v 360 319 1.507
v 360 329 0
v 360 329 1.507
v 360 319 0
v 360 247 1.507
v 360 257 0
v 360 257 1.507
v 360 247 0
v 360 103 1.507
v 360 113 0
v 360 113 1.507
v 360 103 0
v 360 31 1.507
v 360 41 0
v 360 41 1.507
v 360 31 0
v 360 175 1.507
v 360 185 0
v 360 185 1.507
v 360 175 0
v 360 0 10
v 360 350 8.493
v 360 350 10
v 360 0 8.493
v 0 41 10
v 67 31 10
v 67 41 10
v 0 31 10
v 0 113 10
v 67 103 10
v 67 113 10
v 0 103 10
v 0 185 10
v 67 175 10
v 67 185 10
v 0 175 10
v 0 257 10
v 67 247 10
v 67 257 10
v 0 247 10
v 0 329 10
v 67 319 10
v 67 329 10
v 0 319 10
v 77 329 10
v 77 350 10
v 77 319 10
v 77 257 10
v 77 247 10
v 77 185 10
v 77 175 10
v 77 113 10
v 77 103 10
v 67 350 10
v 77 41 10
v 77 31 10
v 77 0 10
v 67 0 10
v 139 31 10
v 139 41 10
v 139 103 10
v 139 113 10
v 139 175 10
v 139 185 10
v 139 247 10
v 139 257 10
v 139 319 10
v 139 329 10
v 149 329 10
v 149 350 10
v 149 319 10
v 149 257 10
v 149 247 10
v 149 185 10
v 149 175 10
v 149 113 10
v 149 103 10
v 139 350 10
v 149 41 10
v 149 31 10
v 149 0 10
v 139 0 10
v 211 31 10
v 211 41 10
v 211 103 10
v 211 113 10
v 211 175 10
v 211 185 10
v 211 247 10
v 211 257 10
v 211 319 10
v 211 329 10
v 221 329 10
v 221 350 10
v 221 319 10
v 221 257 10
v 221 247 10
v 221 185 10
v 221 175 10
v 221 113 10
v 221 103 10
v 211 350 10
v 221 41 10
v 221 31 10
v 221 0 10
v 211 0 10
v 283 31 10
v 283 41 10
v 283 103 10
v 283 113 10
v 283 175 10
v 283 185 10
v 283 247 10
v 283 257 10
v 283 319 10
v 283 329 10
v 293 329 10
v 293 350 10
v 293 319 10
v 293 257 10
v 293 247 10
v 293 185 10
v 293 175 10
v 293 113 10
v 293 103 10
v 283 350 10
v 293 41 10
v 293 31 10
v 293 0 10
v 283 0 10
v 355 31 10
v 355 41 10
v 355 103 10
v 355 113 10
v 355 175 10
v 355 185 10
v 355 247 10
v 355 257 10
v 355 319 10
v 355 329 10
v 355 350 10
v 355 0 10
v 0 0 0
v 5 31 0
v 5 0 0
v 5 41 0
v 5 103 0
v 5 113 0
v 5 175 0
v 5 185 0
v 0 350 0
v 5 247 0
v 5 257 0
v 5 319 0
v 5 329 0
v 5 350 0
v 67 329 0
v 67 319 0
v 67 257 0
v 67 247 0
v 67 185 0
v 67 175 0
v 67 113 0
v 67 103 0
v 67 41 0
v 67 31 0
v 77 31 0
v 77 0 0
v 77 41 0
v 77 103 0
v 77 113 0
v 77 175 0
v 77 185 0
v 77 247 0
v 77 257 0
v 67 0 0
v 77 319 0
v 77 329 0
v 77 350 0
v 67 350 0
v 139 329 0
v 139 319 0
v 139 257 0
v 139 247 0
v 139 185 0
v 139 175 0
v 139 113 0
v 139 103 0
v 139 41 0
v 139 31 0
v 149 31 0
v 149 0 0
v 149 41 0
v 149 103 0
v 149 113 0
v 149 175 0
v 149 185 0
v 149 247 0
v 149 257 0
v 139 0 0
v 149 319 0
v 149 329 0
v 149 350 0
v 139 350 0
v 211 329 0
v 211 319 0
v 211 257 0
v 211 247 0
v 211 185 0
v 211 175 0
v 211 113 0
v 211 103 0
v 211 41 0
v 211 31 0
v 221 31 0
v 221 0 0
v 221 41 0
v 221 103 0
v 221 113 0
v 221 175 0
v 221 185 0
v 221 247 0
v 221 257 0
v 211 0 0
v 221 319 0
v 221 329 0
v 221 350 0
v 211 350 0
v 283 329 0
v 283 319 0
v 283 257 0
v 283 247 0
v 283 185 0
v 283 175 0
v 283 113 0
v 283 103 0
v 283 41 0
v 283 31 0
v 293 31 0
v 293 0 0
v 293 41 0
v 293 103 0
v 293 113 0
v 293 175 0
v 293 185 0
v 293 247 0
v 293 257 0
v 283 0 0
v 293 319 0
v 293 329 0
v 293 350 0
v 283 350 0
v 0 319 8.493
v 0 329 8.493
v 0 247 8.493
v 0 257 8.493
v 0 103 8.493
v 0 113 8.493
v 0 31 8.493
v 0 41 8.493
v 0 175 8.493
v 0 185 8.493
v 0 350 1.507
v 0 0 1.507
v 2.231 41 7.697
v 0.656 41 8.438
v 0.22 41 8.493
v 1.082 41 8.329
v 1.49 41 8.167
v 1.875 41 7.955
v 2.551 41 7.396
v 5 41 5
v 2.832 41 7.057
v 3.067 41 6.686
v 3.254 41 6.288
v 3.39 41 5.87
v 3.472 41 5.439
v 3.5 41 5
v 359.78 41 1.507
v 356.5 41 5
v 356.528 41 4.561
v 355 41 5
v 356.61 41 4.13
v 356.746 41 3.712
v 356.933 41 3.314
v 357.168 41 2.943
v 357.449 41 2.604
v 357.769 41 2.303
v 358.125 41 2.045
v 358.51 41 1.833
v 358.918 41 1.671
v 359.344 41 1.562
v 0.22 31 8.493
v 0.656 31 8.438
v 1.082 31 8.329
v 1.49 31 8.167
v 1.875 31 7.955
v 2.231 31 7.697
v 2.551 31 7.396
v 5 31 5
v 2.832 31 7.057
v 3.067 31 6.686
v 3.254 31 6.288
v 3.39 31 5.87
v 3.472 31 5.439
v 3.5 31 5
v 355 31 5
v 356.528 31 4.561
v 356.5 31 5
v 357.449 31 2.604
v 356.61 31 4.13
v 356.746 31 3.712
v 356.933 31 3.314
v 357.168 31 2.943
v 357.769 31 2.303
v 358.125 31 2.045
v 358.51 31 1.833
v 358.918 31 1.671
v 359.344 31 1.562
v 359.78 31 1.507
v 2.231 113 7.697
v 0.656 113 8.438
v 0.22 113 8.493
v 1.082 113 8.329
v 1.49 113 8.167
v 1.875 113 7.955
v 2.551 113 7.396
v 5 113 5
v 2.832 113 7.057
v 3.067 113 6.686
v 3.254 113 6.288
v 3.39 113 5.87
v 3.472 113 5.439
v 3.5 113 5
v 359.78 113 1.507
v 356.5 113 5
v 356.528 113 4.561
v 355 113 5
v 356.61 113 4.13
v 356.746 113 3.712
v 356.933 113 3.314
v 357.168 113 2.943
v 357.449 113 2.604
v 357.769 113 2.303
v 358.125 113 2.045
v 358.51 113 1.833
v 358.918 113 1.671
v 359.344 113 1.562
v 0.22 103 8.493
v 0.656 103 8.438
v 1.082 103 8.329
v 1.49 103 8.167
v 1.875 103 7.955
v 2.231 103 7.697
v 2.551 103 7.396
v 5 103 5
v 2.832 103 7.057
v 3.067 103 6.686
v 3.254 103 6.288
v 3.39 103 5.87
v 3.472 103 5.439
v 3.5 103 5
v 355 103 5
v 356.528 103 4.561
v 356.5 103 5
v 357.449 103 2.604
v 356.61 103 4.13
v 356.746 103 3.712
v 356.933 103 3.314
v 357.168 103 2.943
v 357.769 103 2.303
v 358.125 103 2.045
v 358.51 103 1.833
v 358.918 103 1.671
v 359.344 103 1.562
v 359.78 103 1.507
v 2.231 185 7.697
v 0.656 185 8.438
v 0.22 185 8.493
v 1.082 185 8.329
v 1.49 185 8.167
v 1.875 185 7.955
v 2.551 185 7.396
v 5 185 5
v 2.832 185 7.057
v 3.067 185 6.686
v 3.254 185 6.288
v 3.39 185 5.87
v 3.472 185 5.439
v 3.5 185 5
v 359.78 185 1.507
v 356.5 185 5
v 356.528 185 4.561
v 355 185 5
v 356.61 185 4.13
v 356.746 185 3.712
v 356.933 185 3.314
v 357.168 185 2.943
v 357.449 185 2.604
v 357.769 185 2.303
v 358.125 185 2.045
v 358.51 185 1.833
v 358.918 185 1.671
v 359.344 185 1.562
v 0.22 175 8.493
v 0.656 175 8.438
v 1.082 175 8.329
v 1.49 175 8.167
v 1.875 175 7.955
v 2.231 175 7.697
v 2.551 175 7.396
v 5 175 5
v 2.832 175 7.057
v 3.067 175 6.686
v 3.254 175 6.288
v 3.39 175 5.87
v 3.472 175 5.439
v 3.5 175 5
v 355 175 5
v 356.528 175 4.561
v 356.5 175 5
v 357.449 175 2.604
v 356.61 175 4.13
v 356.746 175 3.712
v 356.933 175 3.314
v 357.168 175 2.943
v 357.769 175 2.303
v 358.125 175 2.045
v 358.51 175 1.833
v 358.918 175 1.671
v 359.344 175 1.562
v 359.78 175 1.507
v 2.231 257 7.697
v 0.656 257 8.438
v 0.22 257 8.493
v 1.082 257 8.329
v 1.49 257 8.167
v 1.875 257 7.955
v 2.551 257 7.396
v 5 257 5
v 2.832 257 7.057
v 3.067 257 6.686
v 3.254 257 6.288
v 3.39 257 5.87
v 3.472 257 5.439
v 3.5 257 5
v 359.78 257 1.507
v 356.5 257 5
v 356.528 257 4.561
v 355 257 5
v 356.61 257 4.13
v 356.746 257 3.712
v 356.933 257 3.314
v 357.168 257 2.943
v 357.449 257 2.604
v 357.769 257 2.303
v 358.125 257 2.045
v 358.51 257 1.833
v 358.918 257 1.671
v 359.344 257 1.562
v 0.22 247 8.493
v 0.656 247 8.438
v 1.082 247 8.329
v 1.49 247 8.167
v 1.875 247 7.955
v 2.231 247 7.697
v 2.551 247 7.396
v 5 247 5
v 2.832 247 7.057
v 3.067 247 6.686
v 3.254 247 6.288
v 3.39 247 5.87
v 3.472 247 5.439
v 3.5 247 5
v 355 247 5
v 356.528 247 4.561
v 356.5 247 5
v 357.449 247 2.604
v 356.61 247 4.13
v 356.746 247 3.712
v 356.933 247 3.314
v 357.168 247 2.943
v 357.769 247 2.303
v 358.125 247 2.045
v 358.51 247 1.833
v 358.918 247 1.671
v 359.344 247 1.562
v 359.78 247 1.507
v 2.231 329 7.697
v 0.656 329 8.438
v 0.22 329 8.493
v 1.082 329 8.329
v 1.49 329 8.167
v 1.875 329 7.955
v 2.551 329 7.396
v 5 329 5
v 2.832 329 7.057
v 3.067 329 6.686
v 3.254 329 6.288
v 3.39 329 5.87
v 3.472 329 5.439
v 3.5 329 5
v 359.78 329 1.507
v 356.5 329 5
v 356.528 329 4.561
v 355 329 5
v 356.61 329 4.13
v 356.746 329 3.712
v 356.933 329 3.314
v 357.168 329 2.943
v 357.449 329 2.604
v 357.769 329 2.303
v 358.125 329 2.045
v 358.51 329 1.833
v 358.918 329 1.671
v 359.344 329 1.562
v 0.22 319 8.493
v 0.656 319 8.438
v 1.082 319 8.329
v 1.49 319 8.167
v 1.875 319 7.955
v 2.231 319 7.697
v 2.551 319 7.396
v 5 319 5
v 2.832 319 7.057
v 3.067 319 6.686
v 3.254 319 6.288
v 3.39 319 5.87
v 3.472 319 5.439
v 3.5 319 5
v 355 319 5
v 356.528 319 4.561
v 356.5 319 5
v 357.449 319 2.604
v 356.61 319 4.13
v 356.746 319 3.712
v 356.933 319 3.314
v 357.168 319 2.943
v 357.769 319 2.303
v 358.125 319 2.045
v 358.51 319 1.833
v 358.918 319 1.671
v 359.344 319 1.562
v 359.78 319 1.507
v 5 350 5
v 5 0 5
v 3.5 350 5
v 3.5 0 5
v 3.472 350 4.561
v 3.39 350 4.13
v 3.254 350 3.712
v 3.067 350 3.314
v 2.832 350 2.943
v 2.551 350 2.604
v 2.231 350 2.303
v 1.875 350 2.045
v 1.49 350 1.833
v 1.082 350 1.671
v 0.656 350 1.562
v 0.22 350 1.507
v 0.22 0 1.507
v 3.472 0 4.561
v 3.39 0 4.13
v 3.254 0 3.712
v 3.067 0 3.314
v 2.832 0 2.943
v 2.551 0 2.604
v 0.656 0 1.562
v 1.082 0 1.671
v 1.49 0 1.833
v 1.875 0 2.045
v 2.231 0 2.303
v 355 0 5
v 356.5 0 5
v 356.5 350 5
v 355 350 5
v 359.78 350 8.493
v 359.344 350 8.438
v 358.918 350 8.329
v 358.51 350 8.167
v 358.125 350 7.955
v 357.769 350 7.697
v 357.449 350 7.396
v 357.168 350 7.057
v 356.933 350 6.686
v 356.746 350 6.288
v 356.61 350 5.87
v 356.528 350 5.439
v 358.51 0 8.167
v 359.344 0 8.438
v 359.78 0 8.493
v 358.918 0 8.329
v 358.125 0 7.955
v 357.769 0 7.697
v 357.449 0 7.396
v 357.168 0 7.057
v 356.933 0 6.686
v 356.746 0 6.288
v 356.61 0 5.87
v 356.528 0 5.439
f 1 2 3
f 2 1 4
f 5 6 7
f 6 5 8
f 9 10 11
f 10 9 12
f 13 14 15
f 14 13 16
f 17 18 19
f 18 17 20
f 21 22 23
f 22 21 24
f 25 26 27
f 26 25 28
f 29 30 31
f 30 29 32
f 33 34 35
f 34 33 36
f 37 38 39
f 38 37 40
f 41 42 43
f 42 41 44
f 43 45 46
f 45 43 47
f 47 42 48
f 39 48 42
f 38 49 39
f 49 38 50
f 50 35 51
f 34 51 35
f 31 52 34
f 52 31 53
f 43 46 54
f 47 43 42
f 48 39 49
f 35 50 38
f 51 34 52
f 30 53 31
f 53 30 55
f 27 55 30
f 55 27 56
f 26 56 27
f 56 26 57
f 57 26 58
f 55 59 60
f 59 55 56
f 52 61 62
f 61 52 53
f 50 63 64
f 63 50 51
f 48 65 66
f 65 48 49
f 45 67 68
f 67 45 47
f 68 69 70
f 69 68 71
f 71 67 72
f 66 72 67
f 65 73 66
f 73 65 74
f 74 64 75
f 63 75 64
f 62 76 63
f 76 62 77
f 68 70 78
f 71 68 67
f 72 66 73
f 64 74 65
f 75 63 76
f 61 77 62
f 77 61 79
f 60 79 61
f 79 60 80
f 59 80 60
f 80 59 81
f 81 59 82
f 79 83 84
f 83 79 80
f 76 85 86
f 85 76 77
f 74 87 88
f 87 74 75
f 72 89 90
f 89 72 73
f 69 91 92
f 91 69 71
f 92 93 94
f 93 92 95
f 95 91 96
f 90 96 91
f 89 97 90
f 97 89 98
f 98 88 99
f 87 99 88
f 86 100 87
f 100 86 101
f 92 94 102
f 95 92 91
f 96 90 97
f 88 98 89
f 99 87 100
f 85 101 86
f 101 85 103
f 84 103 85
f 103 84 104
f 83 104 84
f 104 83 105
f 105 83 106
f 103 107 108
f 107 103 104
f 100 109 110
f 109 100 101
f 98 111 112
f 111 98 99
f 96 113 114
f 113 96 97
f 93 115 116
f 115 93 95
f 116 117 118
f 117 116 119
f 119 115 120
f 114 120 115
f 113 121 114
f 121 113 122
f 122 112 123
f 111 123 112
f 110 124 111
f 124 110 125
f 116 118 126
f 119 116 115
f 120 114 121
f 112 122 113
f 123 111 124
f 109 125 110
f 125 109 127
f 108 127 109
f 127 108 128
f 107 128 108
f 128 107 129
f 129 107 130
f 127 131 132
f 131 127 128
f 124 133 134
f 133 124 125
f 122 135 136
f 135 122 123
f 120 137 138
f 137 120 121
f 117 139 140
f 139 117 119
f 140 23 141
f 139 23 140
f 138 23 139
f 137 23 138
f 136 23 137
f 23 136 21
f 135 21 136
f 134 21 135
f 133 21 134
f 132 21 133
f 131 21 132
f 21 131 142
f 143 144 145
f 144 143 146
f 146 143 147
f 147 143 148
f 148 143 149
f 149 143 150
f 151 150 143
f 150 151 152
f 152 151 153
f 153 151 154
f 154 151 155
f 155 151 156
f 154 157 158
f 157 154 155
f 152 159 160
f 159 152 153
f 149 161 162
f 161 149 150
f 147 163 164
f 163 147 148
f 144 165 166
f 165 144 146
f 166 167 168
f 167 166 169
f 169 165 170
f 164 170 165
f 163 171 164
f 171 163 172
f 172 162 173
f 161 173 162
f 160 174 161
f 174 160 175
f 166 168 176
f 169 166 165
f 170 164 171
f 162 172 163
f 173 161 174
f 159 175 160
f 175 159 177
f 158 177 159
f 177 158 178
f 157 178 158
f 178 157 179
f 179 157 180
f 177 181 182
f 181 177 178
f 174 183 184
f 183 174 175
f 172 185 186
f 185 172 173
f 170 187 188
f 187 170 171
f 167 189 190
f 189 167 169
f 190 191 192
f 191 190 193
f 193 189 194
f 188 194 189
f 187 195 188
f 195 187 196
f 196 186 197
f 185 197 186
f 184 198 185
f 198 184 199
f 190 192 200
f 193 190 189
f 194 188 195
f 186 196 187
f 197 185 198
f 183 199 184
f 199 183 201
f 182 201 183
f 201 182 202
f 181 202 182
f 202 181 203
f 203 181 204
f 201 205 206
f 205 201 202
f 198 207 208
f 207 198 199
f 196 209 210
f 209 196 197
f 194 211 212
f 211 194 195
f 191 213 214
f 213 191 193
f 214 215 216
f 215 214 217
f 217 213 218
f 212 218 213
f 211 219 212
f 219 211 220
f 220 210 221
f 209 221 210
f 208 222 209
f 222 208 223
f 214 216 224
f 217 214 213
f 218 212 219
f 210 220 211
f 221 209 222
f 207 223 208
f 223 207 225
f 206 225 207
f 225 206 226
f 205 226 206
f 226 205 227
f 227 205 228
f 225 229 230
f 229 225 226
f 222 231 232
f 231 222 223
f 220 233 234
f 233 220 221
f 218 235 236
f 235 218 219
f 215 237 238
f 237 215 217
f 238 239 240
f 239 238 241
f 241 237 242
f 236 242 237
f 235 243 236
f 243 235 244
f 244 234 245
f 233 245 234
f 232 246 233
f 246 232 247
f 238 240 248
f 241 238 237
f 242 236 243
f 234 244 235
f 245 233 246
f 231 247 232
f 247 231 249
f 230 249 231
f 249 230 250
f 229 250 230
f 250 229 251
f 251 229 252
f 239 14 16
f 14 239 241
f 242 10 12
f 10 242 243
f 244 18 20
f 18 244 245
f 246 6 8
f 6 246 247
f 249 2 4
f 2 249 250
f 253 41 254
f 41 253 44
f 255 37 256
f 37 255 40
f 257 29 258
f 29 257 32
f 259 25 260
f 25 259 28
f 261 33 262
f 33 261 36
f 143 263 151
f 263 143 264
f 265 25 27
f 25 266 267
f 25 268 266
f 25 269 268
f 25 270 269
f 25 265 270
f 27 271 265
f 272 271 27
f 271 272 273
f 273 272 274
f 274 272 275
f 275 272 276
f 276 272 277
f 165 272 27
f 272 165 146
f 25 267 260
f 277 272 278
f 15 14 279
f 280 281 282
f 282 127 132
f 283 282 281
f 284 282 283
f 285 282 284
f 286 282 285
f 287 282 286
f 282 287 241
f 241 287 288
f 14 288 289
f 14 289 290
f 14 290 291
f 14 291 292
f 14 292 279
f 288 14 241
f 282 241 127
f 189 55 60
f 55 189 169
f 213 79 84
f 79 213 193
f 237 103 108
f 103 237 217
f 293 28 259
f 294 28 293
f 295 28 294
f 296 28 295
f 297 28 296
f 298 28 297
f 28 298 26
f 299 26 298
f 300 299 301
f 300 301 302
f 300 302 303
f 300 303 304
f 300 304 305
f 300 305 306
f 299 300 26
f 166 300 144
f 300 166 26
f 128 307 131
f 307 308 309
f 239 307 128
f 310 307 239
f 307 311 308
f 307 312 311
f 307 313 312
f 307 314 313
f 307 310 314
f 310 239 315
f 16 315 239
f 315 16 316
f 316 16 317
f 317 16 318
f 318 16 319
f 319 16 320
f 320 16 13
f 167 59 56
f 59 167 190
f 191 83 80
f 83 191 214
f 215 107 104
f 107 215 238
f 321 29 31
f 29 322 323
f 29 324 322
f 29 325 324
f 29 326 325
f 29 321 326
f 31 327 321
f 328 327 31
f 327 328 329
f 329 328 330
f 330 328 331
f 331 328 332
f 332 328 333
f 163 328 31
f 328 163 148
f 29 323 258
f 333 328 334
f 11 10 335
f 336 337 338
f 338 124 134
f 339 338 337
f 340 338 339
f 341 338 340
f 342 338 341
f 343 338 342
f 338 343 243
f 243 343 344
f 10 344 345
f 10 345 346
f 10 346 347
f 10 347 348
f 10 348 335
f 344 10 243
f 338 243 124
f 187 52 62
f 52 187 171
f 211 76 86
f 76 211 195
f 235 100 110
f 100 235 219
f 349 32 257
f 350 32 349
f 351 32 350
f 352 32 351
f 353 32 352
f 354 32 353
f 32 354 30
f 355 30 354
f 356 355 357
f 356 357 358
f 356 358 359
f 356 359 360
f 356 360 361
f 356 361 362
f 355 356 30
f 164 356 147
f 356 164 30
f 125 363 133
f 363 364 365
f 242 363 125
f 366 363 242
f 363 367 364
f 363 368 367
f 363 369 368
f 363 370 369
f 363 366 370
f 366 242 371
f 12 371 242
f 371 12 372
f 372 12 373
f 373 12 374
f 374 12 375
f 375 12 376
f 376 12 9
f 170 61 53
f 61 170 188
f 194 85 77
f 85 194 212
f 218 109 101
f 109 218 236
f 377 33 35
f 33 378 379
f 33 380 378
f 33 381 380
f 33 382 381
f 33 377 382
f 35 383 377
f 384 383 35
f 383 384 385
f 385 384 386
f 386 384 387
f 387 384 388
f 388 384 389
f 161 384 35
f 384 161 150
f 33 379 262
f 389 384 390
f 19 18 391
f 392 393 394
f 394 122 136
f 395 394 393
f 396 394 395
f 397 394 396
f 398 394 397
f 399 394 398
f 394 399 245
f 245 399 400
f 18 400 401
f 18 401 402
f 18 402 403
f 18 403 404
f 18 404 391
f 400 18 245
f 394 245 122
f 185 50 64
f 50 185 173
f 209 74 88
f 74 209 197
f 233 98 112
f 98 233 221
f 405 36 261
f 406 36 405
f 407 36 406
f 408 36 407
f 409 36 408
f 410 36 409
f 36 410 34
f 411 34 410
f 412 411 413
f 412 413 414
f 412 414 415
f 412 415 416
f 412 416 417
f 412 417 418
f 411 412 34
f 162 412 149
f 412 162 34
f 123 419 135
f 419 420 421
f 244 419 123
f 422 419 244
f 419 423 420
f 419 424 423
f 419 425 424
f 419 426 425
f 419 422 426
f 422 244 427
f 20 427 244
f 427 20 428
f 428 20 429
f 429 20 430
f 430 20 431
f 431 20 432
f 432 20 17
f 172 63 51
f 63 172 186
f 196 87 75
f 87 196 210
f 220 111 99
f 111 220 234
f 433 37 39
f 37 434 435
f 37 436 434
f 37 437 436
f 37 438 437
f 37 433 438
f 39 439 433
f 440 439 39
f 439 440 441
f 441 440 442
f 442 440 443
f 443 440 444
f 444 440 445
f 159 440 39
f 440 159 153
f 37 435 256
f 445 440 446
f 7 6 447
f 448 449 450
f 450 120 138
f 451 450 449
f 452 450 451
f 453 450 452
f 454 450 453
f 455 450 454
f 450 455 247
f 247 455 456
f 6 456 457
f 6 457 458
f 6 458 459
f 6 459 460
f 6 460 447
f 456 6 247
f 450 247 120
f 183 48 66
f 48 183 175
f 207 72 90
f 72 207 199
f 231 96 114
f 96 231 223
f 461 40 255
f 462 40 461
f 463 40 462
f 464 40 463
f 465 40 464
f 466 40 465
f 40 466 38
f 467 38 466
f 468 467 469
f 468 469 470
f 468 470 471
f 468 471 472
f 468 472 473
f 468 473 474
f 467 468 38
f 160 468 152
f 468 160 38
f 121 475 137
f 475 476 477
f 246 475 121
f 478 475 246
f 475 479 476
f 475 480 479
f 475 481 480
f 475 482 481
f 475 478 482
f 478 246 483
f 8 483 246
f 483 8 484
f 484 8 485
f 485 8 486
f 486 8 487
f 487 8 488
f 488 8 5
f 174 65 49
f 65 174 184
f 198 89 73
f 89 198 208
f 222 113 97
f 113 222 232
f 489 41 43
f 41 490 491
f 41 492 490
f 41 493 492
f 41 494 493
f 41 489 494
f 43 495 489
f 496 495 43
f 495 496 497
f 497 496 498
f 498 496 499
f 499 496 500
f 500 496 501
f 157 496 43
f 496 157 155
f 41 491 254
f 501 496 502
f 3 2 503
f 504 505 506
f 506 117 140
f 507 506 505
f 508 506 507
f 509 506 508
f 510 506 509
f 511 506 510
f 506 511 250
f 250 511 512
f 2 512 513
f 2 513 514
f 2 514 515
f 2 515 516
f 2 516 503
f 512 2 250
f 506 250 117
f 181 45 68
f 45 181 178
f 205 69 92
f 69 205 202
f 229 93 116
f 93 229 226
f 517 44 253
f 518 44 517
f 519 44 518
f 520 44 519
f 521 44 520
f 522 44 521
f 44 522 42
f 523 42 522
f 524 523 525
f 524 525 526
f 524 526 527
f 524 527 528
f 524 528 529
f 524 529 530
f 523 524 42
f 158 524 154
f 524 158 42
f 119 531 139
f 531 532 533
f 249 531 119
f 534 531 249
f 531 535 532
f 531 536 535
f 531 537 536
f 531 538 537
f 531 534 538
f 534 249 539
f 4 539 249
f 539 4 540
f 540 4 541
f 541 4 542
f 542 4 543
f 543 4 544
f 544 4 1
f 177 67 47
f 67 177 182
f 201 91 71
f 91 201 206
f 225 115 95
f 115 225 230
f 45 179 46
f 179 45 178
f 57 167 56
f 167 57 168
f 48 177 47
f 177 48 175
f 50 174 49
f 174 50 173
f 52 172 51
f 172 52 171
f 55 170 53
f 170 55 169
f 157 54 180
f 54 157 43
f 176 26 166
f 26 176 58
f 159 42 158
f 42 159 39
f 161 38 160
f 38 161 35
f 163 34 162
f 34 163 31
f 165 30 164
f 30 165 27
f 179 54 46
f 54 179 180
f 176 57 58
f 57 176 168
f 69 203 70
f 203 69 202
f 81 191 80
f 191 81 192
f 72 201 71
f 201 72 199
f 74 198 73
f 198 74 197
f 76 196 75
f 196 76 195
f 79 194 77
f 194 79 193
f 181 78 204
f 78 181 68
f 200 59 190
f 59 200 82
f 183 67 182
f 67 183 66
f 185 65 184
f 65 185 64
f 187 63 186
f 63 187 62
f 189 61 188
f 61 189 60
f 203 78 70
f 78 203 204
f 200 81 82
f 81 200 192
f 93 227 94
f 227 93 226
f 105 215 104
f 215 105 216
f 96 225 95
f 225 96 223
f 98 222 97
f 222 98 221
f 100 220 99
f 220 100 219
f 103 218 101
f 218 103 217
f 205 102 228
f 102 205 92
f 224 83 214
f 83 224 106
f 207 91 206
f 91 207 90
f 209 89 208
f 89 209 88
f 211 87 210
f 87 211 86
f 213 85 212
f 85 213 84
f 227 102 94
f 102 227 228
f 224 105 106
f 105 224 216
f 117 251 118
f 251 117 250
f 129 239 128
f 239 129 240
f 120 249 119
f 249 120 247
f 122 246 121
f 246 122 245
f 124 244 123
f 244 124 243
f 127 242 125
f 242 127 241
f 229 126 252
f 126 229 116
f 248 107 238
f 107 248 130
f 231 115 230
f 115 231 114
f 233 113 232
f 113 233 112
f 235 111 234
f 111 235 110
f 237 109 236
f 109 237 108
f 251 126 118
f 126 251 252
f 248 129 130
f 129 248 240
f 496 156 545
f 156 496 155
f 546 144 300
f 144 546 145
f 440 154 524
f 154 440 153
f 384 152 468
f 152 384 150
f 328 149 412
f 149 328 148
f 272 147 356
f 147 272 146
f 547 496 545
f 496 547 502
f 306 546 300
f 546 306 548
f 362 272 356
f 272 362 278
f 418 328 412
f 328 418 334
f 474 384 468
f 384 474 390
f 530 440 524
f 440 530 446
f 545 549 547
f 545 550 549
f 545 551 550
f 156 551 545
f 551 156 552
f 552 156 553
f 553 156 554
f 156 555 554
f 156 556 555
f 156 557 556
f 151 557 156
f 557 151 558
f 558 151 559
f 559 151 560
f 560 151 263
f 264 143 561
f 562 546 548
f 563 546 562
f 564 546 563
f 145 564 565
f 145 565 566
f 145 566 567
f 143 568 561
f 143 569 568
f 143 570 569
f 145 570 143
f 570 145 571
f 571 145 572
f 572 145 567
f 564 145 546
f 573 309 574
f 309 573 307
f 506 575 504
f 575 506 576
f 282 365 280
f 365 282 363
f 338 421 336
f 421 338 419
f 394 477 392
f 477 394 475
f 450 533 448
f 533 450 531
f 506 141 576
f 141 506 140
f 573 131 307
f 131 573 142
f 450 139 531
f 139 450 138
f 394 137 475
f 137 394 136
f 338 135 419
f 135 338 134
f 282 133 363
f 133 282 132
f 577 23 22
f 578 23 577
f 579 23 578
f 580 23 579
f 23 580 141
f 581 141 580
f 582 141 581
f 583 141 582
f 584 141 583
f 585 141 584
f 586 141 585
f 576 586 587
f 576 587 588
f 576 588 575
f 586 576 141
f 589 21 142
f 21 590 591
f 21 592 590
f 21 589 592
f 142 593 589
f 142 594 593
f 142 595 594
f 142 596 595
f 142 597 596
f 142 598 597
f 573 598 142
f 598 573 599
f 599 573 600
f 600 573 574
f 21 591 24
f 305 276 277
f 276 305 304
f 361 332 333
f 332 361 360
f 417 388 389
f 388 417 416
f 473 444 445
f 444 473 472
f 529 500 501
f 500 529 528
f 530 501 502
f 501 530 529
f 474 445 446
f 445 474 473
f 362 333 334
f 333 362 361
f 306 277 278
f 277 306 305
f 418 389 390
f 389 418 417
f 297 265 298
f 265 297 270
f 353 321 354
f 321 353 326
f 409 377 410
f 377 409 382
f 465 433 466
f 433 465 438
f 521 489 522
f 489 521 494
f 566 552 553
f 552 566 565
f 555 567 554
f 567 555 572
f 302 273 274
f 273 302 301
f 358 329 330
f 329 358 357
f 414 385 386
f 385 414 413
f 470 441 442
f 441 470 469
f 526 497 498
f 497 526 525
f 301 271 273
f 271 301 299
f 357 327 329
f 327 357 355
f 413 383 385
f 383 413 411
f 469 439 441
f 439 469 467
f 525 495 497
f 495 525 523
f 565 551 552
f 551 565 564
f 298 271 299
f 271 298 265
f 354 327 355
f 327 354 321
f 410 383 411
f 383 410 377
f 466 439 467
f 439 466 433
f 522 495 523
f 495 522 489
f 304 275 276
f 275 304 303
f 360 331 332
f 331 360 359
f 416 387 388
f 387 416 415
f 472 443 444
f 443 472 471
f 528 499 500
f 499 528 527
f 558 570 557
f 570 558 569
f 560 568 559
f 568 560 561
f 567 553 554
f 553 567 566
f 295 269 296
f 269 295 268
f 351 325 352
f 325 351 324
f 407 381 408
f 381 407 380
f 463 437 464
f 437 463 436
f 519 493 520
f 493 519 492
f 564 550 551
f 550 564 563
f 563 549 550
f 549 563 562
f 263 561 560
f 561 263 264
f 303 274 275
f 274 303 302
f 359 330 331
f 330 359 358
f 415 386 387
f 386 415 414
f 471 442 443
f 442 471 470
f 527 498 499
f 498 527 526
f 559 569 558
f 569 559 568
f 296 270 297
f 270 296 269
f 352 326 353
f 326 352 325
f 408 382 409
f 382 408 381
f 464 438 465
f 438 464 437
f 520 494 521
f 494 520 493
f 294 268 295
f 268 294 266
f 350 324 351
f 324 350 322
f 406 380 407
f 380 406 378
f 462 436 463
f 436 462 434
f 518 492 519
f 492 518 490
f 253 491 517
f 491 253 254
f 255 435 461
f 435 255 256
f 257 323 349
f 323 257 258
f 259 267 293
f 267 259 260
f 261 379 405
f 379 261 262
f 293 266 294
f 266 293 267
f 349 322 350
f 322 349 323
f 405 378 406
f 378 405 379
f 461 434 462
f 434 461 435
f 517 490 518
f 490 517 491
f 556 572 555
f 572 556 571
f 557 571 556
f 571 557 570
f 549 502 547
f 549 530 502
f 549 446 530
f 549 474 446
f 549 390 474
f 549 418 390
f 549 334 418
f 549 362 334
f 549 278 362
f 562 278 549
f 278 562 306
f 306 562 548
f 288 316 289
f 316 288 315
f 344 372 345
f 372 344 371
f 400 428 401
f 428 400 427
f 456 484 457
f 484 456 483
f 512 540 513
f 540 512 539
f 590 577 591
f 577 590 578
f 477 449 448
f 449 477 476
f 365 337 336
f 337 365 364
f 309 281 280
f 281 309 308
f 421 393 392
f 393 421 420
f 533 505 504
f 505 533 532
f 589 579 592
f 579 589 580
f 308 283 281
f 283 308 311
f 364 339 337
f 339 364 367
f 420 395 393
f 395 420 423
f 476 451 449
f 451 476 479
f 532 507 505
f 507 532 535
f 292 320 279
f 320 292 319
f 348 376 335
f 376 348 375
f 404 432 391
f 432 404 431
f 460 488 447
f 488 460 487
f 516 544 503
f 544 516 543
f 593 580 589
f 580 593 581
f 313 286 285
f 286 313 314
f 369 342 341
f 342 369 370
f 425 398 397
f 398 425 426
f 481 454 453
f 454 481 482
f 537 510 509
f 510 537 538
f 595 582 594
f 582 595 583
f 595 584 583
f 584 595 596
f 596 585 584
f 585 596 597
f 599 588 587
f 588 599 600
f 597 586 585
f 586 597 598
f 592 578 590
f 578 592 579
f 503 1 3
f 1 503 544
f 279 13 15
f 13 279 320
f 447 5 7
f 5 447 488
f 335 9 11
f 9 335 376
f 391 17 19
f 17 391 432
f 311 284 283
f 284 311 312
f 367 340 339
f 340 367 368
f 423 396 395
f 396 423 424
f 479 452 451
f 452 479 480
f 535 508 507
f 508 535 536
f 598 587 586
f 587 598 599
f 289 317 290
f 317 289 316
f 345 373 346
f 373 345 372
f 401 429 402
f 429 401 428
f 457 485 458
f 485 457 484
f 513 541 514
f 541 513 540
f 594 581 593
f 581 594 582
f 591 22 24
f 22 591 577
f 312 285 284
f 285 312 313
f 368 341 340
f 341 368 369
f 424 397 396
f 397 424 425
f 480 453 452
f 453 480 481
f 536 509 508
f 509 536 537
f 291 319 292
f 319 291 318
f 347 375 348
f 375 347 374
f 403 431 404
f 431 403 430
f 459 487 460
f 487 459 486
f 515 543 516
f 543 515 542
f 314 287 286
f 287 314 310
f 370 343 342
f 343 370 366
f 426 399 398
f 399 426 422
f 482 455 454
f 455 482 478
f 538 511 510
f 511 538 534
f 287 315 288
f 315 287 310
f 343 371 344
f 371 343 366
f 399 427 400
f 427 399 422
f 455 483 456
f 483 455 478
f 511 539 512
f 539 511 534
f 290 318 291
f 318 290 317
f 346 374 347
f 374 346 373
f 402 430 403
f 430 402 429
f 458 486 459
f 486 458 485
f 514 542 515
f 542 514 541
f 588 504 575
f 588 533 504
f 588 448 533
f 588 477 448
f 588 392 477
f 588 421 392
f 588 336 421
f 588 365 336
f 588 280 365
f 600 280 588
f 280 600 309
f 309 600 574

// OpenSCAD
difference() {
union() {
translate([67,0,0]) cube([10,350,10]);
translate([139,0,0]) cube([10,350,10]);
translate([211,0,0]) cube([10,350,10]);
translate([283,0,0]) cube([10,350,10]);
h = [36,108,180,252,324];
for (c = h) {
translate([0, c-5,0]) cube([360,10,10]);
}
translate([0,0,0]) cube([5,350,5]);
translate([355,0,5]) cube([5,350,5]);
}
intersection() {
translate([0,175,5]) rotate([90,0,0]) cylinder(h=352, r=3.5, $fn=50, center=true);
translate([-1,0,0]) cube([10,350,10]);
}
intersection() {
translate([360,175,5]) rotate([90,0,0]) cylinder(h=352, r=3.5, $fn=50, center=true);
translate([355,0,0]) cube([10,350,10]);
}
}
